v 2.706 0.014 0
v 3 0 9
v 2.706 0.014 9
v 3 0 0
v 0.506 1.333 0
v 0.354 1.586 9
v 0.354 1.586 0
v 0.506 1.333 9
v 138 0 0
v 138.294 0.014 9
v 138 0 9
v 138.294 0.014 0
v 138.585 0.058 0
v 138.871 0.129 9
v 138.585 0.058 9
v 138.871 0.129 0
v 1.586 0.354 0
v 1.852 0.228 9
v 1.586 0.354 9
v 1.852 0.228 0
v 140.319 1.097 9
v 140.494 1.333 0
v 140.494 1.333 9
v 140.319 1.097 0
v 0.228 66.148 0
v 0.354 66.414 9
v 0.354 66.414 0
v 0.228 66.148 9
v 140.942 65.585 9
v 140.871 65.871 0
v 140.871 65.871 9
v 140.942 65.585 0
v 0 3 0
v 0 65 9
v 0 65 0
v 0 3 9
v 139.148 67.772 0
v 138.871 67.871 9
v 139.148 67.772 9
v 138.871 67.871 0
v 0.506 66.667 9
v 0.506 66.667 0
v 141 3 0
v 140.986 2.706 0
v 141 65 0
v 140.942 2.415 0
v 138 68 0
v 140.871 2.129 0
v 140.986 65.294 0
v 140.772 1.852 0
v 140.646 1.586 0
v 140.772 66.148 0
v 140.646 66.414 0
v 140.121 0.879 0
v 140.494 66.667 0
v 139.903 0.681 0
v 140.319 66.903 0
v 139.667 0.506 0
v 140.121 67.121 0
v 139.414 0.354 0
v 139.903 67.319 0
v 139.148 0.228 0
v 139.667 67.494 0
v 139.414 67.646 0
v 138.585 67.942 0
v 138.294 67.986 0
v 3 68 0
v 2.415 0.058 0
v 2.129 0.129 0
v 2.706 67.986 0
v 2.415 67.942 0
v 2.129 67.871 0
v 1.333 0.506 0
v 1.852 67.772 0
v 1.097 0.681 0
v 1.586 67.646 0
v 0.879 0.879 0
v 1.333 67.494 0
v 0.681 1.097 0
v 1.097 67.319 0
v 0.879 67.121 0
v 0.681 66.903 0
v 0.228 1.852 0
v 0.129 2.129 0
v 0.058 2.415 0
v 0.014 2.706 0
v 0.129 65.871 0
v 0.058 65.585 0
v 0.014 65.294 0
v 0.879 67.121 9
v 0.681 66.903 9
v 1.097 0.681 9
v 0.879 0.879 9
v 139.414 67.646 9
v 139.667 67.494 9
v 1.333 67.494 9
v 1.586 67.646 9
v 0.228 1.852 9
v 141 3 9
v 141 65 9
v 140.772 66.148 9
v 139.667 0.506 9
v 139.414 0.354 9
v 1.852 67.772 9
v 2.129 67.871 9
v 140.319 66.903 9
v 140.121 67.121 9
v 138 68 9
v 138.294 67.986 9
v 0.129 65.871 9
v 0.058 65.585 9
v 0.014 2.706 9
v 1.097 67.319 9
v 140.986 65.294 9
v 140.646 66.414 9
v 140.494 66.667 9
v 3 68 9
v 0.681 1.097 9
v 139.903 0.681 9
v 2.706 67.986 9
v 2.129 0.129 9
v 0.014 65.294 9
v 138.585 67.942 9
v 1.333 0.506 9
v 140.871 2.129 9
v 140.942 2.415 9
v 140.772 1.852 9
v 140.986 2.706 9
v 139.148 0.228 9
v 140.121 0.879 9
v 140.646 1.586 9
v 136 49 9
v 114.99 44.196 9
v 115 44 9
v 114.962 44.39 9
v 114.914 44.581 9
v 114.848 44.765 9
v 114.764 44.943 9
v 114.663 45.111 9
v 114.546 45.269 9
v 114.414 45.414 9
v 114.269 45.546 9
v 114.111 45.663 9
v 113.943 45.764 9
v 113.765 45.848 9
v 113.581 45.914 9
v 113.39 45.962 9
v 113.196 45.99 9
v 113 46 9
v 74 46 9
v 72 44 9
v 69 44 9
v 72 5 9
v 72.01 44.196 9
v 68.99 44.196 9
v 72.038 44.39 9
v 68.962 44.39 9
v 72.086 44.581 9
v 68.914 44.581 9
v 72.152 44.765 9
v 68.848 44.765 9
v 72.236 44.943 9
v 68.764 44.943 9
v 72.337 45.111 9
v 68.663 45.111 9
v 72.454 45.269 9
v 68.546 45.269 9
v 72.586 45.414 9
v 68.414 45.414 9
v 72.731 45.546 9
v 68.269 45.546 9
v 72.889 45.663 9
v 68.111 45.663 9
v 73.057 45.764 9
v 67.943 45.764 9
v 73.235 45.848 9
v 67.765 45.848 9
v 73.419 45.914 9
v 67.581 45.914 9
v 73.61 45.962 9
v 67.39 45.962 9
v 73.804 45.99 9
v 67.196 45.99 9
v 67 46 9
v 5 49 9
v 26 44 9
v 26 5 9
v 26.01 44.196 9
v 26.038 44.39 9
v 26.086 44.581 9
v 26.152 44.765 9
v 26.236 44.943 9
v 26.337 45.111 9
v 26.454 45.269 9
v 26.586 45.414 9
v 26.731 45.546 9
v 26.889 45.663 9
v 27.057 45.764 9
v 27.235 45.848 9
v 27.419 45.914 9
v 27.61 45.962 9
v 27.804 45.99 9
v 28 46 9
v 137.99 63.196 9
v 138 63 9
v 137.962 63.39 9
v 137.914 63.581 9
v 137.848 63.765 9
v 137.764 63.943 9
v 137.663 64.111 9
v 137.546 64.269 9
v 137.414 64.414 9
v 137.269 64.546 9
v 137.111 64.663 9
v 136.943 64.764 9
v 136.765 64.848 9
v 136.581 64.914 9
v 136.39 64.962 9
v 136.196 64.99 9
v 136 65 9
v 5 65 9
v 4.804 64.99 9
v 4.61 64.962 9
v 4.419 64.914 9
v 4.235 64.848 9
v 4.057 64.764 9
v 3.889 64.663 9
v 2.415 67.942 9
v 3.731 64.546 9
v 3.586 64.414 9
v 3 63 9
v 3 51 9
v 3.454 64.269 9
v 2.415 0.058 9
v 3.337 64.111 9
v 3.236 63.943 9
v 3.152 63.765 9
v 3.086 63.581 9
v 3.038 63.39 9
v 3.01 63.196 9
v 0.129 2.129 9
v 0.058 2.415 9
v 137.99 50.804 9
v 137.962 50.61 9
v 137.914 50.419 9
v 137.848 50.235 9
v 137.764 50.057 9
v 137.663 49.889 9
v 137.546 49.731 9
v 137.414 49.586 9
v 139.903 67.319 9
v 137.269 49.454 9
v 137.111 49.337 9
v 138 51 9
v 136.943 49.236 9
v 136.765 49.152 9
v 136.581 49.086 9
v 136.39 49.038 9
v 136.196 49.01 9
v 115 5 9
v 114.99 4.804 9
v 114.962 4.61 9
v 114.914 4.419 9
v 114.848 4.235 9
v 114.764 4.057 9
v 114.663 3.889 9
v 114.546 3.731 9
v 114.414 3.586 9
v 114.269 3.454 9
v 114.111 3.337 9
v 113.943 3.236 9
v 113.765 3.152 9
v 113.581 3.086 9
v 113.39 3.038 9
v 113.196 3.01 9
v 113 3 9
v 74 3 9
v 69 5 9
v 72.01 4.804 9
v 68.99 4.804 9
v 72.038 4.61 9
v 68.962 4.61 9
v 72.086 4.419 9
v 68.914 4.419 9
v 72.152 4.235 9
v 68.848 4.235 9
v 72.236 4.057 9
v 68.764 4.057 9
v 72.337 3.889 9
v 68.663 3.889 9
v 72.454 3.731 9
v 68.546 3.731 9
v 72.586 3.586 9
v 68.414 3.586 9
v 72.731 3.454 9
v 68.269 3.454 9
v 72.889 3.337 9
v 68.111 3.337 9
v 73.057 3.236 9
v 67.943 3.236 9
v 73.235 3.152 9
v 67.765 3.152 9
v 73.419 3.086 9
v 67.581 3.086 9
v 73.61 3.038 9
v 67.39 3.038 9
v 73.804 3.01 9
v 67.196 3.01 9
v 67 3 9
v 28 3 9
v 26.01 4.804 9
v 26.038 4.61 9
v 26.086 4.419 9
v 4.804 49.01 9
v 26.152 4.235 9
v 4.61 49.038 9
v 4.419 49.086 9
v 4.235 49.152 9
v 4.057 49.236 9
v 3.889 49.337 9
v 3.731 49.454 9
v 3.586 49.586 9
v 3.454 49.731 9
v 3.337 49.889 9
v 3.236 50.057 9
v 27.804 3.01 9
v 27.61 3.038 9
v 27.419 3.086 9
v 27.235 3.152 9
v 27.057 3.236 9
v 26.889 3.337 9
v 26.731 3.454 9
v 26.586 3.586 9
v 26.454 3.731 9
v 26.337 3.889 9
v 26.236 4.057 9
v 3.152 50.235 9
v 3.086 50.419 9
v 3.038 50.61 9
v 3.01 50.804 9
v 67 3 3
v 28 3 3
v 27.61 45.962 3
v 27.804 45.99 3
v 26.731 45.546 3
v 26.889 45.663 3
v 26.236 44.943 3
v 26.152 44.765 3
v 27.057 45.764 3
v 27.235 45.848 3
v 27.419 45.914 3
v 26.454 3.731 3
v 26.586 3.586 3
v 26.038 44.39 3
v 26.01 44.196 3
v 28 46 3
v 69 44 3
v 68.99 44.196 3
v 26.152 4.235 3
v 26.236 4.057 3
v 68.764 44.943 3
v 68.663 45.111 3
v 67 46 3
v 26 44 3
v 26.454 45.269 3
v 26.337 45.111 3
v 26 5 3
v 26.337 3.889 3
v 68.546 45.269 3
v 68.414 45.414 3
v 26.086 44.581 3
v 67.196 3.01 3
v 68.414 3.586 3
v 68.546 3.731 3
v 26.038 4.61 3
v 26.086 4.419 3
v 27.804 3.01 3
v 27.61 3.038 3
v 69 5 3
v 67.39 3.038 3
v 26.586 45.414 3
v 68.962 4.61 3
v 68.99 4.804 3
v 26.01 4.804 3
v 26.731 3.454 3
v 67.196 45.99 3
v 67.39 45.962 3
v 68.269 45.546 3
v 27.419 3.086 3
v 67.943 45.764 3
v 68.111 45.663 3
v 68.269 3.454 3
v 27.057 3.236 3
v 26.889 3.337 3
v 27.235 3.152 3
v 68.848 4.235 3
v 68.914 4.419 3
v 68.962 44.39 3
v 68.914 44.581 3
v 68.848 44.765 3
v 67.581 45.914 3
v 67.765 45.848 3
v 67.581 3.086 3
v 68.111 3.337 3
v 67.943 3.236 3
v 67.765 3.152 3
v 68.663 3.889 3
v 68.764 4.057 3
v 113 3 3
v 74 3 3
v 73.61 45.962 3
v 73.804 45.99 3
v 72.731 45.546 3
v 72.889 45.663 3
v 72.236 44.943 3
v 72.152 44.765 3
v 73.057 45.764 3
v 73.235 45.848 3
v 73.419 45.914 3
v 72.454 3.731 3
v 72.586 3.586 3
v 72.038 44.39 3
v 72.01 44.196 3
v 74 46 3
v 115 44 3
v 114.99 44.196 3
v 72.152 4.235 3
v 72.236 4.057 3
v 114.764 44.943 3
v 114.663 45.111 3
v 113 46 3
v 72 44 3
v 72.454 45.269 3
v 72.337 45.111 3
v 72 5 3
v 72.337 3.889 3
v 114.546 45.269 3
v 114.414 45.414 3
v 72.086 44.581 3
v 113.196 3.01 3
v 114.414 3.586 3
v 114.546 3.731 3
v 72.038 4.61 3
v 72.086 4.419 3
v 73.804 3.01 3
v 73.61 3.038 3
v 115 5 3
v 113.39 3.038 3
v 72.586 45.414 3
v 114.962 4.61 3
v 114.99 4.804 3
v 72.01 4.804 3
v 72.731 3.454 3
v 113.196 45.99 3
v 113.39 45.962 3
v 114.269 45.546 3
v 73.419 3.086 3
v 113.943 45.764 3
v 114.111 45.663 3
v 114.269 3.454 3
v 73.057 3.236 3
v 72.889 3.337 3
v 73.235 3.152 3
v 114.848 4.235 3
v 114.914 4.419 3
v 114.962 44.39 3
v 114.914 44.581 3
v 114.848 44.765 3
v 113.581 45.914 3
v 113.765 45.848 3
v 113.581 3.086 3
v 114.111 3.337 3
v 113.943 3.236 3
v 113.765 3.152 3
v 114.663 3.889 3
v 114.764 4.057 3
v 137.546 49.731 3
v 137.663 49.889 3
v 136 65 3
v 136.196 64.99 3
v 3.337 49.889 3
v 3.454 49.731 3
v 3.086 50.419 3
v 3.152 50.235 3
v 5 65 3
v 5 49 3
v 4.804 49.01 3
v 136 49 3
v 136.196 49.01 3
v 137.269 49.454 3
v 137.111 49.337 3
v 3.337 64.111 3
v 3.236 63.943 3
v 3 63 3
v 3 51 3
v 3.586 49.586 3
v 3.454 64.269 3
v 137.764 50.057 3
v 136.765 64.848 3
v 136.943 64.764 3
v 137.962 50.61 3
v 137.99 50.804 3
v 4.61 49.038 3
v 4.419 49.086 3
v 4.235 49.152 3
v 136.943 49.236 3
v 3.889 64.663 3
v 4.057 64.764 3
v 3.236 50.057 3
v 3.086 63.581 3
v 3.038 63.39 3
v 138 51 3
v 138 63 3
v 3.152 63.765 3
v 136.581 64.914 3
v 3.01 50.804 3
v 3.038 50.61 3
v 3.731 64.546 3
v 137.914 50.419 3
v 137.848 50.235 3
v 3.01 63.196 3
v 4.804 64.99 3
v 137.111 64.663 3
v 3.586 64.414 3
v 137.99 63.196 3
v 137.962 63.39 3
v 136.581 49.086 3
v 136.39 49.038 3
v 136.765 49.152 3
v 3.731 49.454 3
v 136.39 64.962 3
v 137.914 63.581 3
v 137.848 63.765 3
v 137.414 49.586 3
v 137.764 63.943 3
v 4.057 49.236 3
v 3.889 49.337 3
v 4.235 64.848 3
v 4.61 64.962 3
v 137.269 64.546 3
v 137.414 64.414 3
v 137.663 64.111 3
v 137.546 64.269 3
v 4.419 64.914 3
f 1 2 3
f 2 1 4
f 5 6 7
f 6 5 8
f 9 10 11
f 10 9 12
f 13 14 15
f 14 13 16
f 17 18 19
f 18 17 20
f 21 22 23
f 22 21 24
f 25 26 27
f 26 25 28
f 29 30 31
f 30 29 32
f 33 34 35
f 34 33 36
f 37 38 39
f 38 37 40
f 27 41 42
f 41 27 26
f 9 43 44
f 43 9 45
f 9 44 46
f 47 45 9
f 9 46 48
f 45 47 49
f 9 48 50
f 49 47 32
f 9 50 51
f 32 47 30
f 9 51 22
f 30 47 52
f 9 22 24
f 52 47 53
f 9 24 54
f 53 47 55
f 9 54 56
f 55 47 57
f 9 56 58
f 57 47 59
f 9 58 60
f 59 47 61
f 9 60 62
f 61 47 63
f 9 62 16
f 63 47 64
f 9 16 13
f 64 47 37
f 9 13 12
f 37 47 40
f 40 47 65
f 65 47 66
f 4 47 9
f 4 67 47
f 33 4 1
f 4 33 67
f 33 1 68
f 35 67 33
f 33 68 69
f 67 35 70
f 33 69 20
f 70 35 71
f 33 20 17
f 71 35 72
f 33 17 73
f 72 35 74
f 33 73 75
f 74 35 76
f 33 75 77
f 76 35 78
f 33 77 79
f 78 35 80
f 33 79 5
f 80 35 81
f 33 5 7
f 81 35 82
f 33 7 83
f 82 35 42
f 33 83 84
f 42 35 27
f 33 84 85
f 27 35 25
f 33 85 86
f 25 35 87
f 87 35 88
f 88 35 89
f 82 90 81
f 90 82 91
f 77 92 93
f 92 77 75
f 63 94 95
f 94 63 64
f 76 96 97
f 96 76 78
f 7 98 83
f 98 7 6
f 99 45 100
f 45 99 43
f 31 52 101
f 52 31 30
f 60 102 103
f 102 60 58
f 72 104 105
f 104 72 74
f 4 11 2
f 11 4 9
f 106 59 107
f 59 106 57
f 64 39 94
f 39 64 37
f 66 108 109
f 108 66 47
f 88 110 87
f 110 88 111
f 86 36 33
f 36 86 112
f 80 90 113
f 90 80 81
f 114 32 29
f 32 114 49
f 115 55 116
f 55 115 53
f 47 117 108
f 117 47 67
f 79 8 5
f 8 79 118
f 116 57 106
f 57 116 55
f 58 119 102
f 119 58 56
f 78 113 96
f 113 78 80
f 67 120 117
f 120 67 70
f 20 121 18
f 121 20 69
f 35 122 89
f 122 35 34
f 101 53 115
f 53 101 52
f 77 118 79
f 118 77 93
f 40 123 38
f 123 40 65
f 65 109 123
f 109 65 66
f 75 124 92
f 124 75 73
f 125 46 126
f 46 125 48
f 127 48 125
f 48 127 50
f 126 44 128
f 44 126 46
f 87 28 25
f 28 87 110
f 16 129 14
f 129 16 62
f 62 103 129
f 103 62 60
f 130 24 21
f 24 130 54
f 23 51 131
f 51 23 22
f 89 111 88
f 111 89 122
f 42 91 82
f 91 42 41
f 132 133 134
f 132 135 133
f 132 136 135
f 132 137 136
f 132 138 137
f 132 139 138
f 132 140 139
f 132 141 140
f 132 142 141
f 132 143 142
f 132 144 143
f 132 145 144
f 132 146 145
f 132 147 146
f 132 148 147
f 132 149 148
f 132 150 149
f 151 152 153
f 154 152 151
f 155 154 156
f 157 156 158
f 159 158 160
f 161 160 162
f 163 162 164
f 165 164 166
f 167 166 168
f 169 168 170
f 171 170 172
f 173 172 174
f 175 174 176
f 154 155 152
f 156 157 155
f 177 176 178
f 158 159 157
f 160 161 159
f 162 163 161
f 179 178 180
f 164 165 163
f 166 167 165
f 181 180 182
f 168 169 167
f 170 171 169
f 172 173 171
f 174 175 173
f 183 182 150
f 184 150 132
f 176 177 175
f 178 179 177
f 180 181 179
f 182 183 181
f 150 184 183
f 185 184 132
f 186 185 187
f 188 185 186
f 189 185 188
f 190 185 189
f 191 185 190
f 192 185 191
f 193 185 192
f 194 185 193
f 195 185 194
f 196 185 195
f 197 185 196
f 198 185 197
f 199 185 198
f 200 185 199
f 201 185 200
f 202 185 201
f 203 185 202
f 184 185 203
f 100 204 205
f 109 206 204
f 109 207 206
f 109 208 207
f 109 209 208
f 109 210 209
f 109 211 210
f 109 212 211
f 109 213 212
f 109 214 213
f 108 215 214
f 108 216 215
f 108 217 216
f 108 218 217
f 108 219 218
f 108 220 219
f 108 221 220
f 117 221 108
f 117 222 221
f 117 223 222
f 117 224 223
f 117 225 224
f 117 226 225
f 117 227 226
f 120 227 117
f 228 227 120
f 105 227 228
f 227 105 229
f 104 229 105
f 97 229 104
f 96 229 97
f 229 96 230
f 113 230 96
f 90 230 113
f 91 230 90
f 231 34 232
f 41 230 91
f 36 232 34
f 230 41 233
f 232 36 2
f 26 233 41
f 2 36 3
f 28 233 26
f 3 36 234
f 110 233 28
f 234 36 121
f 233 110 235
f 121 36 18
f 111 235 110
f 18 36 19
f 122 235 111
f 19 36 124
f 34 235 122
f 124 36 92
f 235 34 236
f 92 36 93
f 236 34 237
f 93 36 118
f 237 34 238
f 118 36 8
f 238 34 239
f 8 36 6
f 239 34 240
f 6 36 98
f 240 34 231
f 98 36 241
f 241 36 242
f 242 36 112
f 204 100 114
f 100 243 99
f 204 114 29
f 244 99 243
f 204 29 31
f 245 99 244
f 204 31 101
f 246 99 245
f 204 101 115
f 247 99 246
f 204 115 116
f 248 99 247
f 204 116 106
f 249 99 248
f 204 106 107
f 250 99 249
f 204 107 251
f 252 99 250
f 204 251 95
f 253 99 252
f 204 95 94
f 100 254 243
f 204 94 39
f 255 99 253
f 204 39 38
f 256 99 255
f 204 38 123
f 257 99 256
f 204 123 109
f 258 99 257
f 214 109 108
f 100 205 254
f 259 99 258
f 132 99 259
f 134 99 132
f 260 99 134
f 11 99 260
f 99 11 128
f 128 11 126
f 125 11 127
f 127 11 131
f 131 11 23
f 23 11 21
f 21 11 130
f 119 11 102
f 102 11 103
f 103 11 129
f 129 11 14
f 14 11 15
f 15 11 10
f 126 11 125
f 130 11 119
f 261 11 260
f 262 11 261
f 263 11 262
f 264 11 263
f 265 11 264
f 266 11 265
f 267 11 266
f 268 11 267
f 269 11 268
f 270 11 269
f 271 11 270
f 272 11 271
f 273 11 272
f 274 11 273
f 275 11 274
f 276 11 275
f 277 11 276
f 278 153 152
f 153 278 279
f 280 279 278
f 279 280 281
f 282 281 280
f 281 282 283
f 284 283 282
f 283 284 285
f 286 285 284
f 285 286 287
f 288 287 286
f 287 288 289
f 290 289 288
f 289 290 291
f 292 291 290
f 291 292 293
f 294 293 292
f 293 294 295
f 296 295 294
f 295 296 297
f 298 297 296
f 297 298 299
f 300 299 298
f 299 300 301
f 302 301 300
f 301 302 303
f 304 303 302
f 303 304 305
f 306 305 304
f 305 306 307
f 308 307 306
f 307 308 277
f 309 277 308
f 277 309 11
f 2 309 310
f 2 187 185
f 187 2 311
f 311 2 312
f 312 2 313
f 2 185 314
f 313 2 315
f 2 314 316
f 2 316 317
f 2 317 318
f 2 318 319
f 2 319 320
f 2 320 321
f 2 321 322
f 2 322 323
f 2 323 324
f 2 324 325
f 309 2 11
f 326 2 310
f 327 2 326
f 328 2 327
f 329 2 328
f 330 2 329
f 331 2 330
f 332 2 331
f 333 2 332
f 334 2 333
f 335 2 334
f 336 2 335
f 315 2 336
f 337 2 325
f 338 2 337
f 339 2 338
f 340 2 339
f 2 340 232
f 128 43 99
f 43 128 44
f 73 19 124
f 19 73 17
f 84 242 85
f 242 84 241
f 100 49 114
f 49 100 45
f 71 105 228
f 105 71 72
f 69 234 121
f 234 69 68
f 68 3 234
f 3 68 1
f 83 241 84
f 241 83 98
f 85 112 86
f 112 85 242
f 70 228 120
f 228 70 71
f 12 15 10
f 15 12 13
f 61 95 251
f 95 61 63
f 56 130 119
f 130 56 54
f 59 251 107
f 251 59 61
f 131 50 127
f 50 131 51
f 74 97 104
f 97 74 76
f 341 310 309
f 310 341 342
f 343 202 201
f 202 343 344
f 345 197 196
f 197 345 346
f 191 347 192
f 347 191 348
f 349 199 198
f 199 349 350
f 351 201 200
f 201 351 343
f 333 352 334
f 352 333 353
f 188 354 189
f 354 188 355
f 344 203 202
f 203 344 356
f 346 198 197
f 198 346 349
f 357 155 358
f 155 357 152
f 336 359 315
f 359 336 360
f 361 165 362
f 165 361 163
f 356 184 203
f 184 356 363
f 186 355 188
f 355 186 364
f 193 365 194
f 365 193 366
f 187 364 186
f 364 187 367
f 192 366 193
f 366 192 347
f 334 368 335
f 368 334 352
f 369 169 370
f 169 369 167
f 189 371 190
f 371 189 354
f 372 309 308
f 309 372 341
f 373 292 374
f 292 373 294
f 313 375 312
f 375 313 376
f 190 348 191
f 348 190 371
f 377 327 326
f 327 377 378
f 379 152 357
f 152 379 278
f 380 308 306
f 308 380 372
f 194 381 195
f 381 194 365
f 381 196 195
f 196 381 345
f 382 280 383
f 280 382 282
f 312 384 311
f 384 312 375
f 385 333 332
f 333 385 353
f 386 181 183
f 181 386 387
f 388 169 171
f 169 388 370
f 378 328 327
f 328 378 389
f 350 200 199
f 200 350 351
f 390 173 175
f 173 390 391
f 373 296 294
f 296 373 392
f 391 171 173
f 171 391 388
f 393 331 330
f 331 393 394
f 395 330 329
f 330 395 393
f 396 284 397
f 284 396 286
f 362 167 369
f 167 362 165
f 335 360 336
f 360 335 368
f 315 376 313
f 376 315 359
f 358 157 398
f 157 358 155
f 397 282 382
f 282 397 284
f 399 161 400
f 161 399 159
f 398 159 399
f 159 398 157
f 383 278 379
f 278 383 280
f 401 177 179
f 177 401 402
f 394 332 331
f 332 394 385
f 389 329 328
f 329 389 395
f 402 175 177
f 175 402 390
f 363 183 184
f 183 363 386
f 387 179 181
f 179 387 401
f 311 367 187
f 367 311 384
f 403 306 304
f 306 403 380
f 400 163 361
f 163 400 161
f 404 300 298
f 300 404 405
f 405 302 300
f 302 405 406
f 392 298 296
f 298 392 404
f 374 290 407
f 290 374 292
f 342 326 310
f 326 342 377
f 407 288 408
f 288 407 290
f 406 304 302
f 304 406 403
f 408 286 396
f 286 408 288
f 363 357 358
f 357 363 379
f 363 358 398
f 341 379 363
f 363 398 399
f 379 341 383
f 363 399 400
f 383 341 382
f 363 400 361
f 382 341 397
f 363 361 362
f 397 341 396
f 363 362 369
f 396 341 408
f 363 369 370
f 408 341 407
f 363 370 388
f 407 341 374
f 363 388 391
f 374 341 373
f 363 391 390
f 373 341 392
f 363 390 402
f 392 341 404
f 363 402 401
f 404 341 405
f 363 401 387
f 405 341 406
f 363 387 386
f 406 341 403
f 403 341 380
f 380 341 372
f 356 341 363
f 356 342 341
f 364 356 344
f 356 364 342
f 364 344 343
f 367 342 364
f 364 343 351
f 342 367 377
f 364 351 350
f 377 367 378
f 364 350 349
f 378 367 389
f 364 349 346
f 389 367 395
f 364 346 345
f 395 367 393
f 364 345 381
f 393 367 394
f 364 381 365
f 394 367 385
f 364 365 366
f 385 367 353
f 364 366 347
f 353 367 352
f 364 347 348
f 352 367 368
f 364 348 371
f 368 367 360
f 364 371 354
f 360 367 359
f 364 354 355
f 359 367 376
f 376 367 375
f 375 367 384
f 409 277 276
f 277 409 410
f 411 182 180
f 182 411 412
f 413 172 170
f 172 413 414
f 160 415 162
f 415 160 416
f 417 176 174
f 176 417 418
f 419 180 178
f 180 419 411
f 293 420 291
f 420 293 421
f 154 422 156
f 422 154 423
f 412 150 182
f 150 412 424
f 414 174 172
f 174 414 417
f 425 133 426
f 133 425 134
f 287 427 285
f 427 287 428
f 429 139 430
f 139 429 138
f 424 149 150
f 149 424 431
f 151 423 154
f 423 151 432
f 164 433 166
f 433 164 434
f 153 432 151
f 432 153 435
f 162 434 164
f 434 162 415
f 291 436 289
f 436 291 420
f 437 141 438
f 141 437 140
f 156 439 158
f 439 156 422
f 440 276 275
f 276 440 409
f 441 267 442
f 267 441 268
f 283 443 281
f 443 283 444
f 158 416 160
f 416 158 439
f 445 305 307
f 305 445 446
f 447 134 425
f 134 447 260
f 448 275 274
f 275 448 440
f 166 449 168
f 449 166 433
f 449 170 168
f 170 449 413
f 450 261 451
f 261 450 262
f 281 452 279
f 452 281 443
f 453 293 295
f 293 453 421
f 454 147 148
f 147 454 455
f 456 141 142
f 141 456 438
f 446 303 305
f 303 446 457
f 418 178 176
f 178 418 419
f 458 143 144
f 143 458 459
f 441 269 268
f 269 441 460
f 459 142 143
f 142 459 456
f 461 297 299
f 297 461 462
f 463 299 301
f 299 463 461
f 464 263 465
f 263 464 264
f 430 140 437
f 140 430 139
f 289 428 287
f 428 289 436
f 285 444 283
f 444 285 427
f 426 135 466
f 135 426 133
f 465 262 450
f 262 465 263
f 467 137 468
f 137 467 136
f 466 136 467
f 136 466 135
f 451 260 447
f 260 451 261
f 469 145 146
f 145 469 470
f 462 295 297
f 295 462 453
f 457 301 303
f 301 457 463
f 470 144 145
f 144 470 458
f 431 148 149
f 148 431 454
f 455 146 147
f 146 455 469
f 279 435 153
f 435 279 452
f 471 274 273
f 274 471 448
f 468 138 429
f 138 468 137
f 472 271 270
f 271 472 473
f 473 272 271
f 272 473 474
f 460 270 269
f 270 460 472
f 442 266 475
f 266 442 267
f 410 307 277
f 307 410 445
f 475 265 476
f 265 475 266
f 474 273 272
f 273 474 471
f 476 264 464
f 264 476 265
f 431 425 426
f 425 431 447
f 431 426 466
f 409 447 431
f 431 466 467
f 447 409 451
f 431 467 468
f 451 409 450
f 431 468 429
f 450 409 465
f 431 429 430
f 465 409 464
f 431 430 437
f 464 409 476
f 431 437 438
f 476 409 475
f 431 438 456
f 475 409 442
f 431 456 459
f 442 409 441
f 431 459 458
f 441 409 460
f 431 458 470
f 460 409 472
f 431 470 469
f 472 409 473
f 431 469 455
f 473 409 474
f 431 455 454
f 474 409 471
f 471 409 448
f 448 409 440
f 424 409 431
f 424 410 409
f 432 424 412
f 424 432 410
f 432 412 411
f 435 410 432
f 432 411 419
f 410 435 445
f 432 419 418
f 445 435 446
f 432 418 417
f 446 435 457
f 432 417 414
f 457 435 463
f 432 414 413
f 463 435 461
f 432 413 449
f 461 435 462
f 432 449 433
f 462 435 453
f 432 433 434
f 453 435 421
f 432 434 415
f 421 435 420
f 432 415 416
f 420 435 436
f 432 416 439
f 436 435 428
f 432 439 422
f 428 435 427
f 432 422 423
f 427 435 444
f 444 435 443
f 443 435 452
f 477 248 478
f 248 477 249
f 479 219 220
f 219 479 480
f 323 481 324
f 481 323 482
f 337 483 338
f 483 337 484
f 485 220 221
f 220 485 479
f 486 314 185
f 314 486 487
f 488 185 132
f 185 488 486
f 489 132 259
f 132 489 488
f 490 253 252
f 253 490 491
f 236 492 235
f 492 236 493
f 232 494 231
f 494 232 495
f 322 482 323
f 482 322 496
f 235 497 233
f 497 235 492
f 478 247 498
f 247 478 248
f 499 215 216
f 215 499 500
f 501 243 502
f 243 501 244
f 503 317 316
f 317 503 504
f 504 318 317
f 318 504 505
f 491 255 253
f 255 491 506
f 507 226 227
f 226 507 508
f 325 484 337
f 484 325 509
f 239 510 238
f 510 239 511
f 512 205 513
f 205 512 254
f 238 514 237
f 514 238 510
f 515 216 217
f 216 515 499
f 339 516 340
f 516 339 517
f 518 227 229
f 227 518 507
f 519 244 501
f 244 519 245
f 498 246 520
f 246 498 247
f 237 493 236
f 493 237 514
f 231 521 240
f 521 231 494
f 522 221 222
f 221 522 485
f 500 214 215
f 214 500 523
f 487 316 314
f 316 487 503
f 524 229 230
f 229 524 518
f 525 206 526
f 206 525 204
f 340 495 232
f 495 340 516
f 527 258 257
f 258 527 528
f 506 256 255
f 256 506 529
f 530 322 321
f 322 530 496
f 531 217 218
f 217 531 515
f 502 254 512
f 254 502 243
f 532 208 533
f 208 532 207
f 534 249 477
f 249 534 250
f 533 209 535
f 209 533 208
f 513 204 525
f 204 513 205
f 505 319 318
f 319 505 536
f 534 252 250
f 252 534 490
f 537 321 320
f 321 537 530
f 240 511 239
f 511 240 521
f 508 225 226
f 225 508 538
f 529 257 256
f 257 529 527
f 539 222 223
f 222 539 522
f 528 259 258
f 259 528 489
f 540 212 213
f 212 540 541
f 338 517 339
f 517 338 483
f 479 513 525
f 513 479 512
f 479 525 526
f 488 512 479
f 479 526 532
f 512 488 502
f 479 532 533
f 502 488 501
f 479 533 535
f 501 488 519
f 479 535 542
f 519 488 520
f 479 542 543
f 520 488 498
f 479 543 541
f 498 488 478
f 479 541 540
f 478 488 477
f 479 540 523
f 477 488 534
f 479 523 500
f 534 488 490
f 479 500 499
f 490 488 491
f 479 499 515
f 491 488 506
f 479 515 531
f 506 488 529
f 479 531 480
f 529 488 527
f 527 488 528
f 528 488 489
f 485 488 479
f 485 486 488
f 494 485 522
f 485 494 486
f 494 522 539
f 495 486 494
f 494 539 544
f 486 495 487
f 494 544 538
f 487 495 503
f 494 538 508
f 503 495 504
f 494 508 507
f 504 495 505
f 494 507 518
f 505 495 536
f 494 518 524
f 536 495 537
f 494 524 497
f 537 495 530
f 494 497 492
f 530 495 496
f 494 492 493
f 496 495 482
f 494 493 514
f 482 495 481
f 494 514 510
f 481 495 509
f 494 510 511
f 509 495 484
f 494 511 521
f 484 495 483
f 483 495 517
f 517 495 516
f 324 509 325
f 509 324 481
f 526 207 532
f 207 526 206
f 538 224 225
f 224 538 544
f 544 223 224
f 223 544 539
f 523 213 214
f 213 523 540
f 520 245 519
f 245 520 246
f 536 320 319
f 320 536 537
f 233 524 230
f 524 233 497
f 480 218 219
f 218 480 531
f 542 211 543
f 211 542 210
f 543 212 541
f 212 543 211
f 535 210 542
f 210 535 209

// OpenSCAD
/* =====================================================
   Tray v2 – Puffco Hot Knife (model 041879) + 2× Square Jars
   =====================================================
   Knife : rectangular prism, ~12×12 mm cross-section, 133 mm long
           (cap always on; sits flat, button-face up)
   Jars  : 42×42 mm footprint, 24 mm tall with lid

   Design intent
   ─────────────
   • Shallow tray (9 mm total) so items protrude well above the rim —
     no finger-scoop cutouts needed because 9 mm walls can't block a hand.
   • Knife slot 6 mm deep → knife sticks up ~6 mm, easy middle-body grip.
   • Jar slots 6 mm deep  → jars stick up 18 mm, trivially pinched from
     any side over the low rim.
   • Rectangular knife slot matches the knife's actual flat-faced profile.

   Exterior: 141 × 68 × 9 mm
   ===================================================== */

$fn = 64;

/* ── Fit & structure ─────────────────────────────────── */
tol  = 1.0;   // per-side clearance (mm)
wall = 3.0;   // wall / divider thickness (mm)
flr  = 3.0;   // floor thickness (mm)
id   = 6.0;   // interior slot depth (mm) — drives tray height
ez   = flr + id;   // 9 mm total tray height

/* ── Knife slot ─────────────────────────────────────────
   Knife cross-section ~12×12 mm; slot is rectangular to
   match its flat faces. The 6 mm depth leaves ~6 mm proud
   of the rim — enough to grip at the body's mid-point.    */
kl    = 133 + 2*tol;   // 135 mm – slot length, along X
kw    = 12  + 2*tol;   // 14  mm – slot width,  along Y
kSlotY = kw + 2;       // 16  mm – Y footprint (little extra room)

/* ── Jar slots ───────────────────────────────────────── */
jw   = 42 + tol;       // 43 mm – square footprint with tolerance

/* ── Interior footprint ─────────────────────────────────
   X : knife length drives it  →  135 mm
   Y : jars (front) + divider + knife slot (rear)
       = 43 + 3 + 16 = 62 mm
   ──────────────────────────────────────────────────── */
ix = kl;                        // 135 mm
iy = jw + wall + kSlotY;        //  62 mm

/* ── Exterior box ────────────────────────────────────── */
ex = ix + 2*wall;   // 141 mm
ey = iy + 2*wall;   //  68 mm

/* ── Slot positions (world coords) ──────────────────────
   Jars : front (small-Y side), centred in X
   Knife: rear  (large-Y side), full interior X
   ──────────────────────────────────────────────────── */
jSecY = wall;                    //  3 mm – jar slots start here

jarsW  = 2*jw + wall;           // 89 mm – two jars + one divider
jMarX  = (ix - jarsW) / 2;     // 23 mm – X margin each side
j1x    = wall + jMarX;          // 26 mm
j2x    = j1x + jw + wall;       // 72 mm

ky0   = wall + jw + wall;       // 49 mm – knife slot starts here
kx0   = wall;                   //  3 mm

/* ── Helpers ─────────────────────────────────────────── */

// Rounded-corner rectangular pocket (cut from above)
module rpocket(w, l, d, r = 2) {
    hull()
        for (dx = [r, w - r], dy = [r, l - r])
            translate([dx, dy, 0]) cylinder(r = r, h = d);
}

// Rounded-corner solid box (outer body)
module rbox(w, l, h, r = 3) {
    hull()
        for (dx = [r, w - r], dy = [r, l - r])
            translate([dx, dy, 0]) cylinder(r = r, h = h);
}

/* ── Tray ────────────────────────────────────────────── */
difference() {
    rbox(ex, ey, ez, r = 3);

    // ── Jar slot 1 (front-left, centred in X) ─────────
    translate([j1x, jSecY, flr])
        rpocket(jw, jw, id + 1, r = 2);

    // ── Jar slot 2 (front-right, centred in X) ────────
    translate([j2x, jSecY, flr])
        rpocket(jw, jw, id + 1, r = 2);

    // ── Knife slot (rear, rectangular, full interior X) ─
    translate([kx0, ky0, flr])
        rpocket(ix, kSlotY, id + 1, r = 2);
}

/* ── Console summary ─────────────────────────────────── */
echo(str("Exterior        : ", ex, " × ", ey, " × ", ez, " mm"));
echo(str("Knife slot      : ", kl, " × ", kSlotY, " mm, ", id, " mm deep"));
echo(str("Jar slots       : ", jw, " × ", jw,  " mm, ", id, " mm deep"));
echo(str("Knife above rim : ~", 12 - id, " mm"));
echo(str("Jars above rim  : ~", 24 - id, " mm"));
